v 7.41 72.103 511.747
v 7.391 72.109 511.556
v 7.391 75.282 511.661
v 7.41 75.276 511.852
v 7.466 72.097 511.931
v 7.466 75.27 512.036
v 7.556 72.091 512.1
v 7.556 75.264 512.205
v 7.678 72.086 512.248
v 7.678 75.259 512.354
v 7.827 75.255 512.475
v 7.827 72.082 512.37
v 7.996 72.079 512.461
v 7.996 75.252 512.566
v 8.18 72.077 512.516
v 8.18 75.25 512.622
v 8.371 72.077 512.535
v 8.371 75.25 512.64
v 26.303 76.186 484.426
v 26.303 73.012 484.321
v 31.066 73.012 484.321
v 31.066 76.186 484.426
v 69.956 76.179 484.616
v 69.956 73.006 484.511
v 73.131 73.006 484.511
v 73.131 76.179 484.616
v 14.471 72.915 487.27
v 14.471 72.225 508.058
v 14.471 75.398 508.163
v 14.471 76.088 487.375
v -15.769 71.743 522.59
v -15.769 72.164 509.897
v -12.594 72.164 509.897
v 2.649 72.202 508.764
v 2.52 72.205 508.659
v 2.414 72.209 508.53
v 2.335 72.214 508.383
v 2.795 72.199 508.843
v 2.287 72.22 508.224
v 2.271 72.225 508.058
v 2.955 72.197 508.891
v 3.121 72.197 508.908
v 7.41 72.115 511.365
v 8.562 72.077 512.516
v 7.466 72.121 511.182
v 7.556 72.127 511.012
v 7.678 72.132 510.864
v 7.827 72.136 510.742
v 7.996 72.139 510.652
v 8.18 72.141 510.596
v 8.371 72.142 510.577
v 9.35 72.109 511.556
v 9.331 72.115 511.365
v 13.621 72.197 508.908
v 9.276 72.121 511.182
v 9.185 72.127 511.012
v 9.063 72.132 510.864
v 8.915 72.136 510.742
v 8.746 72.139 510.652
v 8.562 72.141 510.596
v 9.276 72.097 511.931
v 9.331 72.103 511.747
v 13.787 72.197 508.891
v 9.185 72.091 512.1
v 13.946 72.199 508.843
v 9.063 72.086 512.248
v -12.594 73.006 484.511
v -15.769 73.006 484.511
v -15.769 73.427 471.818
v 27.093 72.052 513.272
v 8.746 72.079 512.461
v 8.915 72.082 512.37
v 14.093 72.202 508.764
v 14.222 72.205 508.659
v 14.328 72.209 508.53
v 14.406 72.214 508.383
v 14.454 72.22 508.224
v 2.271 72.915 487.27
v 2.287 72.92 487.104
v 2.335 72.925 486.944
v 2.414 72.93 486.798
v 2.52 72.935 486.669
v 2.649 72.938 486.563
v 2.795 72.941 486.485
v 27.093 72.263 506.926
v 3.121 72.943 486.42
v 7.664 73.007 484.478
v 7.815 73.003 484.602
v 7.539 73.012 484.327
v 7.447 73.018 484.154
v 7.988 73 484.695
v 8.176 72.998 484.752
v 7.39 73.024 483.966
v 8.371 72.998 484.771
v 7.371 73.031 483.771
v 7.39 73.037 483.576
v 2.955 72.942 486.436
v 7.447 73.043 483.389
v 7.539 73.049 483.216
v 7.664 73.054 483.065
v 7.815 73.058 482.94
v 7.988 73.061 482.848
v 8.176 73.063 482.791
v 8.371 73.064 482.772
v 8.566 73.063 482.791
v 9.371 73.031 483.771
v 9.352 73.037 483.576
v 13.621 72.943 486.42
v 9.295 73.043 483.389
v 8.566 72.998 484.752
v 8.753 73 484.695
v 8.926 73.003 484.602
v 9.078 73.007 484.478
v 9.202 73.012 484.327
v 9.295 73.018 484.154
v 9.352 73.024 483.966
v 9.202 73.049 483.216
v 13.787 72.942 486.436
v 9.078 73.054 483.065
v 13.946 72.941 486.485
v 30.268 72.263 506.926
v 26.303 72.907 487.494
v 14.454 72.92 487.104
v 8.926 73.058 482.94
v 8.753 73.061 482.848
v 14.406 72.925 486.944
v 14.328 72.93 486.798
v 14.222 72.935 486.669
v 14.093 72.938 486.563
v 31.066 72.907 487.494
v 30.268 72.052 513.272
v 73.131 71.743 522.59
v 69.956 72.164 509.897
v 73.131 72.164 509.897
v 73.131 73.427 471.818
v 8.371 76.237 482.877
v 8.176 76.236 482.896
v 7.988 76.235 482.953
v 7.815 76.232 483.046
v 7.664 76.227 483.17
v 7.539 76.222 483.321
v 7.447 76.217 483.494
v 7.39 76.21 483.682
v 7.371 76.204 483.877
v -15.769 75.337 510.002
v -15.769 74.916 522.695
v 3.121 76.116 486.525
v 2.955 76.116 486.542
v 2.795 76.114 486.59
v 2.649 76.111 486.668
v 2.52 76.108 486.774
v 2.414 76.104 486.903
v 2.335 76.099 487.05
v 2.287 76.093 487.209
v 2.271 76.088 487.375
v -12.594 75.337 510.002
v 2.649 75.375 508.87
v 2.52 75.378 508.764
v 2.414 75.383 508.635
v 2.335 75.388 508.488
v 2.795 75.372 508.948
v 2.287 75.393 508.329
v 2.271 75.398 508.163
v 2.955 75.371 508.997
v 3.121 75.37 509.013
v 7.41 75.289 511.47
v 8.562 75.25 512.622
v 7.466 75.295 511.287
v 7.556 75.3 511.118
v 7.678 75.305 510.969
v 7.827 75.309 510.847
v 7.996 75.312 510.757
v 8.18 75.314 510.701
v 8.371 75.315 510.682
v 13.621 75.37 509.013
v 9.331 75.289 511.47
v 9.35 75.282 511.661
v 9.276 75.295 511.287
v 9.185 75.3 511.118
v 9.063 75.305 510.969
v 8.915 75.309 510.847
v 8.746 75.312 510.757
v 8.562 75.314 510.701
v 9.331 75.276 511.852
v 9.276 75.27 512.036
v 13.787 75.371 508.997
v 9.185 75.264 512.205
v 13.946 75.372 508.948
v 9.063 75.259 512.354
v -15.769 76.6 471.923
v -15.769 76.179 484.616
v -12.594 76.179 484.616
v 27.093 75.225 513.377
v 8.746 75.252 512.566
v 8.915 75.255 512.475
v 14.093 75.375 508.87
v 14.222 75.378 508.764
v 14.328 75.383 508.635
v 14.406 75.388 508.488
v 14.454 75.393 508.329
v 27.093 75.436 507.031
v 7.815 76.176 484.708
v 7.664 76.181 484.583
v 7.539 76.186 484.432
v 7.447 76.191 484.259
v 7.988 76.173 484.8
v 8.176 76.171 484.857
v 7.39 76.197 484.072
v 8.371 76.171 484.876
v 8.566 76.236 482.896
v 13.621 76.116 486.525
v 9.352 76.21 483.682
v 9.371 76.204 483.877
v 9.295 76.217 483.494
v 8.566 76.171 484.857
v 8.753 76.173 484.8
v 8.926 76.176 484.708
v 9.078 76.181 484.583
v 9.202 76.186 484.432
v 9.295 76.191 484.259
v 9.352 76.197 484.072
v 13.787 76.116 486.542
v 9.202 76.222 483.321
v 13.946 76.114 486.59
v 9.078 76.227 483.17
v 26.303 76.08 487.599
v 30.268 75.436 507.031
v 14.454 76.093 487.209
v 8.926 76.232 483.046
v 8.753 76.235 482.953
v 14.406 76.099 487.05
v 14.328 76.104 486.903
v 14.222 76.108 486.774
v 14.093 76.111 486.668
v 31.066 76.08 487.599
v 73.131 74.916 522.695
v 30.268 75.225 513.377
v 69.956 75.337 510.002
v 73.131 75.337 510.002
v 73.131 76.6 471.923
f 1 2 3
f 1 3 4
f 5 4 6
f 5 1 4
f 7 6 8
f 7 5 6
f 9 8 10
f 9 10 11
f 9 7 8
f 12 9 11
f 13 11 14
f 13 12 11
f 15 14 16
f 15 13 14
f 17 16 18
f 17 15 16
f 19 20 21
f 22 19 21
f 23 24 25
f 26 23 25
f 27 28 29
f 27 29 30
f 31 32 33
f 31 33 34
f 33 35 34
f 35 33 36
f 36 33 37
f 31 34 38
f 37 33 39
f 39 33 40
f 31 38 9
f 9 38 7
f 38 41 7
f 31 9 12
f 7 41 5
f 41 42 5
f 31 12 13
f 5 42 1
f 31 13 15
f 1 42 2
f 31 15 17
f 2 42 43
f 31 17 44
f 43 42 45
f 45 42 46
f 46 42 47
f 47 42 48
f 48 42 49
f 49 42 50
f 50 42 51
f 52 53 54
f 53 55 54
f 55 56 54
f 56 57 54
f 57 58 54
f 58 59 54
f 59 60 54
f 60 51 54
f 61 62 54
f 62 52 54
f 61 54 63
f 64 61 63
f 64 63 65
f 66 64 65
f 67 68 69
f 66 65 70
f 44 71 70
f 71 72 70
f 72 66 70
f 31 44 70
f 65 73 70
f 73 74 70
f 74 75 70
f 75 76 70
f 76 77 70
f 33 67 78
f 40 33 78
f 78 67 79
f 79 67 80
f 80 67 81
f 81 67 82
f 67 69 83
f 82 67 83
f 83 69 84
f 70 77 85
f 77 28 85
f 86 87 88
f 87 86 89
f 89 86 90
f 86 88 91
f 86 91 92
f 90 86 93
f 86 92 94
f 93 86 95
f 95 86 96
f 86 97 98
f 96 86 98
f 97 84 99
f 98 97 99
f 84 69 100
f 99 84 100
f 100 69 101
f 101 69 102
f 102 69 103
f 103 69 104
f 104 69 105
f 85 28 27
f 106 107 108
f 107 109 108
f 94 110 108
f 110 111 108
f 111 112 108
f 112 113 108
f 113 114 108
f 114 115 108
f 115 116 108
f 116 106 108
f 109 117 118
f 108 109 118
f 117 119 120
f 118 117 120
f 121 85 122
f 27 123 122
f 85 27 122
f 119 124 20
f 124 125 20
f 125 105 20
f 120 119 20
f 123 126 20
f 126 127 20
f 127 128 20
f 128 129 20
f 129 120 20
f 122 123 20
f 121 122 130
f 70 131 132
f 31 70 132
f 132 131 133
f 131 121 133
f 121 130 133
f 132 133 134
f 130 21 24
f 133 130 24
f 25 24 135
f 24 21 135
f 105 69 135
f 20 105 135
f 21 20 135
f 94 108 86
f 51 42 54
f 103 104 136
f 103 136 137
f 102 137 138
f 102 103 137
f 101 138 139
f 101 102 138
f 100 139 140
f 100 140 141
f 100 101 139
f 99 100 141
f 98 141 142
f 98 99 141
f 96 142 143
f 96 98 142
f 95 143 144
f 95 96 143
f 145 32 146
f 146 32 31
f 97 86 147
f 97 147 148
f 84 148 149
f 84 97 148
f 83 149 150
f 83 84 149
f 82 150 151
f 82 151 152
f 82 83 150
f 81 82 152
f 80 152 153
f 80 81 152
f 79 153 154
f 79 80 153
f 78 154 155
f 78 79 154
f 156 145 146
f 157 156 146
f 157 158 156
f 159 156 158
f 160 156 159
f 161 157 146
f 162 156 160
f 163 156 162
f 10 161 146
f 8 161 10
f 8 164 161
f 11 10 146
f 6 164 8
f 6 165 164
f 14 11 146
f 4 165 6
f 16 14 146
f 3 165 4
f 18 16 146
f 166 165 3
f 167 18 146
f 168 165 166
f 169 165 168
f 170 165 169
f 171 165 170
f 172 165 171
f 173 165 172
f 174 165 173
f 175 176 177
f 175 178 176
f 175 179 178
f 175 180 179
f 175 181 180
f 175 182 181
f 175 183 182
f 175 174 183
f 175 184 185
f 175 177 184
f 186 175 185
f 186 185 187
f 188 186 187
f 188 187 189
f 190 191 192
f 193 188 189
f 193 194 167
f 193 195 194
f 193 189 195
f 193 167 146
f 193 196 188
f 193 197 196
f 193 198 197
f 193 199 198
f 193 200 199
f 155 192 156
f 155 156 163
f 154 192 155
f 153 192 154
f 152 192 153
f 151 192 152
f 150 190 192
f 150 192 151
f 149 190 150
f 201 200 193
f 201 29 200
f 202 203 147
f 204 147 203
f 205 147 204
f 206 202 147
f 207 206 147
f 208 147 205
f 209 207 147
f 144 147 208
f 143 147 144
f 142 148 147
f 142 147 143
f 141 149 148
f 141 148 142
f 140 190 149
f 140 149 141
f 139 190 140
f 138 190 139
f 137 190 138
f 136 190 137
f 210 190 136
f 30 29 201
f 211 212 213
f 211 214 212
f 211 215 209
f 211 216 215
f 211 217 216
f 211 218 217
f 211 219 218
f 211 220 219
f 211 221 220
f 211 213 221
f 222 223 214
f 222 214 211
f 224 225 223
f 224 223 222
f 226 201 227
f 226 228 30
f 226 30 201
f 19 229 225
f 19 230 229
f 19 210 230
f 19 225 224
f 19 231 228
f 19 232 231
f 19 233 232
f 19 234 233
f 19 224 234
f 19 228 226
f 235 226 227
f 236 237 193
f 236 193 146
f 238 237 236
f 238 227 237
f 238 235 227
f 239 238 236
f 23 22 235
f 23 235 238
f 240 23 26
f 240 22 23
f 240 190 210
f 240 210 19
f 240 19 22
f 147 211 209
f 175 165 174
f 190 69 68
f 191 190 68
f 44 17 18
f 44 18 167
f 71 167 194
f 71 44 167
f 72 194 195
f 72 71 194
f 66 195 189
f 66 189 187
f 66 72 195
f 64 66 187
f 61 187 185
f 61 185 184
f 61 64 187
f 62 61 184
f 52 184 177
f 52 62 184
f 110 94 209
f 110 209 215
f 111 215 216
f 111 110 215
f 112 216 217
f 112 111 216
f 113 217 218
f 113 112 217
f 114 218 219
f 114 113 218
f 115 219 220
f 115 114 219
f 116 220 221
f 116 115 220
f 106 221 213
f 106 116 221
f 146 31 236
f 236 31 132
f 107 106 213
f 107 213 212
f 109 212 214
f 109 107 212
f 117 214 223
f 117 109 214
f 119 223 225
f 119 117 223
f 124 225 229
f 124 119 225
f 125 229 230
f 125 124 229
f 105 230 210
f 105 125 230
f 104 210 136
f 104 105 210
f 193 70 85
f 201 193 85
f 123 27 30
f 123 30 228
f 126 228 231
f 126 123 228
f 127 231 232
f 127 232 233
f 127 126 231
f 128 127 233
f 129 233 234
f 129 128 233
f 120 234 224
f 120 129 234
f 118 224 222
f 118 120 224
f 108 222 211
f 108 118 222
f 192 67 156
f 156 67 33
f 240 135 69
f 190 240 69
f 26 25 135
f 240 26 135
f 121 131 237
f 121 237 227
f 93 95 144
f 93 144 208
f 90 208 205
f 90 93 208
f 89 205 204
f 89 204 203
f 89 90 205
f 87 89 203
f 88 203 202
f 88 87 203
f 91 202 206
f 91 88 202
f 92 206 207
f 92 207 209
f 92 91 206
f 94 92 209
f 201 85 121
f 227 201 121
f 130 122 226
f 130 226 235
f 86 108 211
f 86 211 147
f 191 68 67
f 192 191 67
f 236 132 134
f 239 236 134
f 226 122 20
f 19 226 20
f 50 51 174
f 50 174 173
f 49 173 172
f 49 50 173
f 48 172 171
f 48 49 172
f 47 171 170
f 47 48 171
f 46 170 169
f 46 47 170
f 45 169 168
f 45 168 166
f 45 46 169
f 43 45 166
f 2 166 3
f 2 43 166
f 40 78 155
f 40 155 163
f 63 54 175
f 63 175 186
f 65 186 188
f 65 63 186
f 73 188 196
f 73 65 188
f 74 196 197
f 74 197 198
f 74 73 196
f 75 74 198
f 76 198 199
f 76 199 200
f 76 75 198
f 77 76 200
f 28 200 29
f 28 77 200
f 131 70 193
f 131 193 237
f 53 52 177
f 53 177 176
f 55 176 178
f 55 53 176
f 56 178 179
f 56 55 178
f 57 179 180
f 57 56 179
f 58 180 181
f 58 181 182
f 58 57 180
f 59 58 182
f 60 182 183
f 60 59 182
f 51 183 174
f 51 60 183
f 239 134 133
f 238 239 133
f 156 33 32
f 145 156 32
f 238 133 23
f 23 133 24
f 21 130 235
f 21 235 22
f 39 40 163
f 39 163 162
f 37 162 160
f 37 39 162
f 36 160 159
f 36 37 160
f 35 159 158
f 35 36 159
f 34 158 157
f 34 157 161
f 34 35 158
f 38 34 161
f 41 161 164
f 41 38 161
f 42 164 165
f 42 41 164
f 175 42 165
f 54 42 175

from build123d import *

# Parameters (mm, degrees)
SKETCH3_W           = 4.7625
SKETCH3_H           = 3.175
SKETCH3_W_2         = 3.175
SKETCH3_H_2         = 6.35
BOSS_EXTRUDE2_DEPTH = 3.175


with BuildPart() as part:
    # Sketch3 → Boss-Extrude2 (new body)
    with BuildSketch(Plane(origin=(0, 88.979885655, 2.951534319), x_dir=(1, 0, 0), z_dir=(0, 0.9994503024750413, 0.03315256977292581))):
        Polygon((73.130884883, -481.824366224), (73.130884883, -469.124366224), (-15.769115117, -469.124366224), (-15.769115117, -481.824366224), (-12.594115117, -481.824366224), (-12.594115117, -507.224366224), (-15.769115117, -507.224366224), (-15.769115117, -519.924366224), (73.130884883, -519.924366224), (73.130884883, -507.224366224), (69.955884883, -507.224366224), (69.955884883, -481.824366224), align=None)
        with Locations((28.684303559, -483.221366224)):
            Rectangle(SKETCH3_W, SKETCH3_H, mode=Mode.SUBTRACT)
        with Locations((28.680884883, -507.426337868)):
            Rectangle(SKETCH3_W_2, SKETCH3_H_2, mode=Mode.SUBTRACT)
        with BuildLine():
            Line((13.62075844, -483.734366224), (3.12075844, -483.734366224))
            ThreePointArc((3.12075844, -483.734366224), (2.519717676, -483.98332546), (2.27075844, -484.584366224))
            Line((2.27075844, -484.584366224), (2.27075844, -505.384366224))
            ThreePointArc((2.27075844, -505.384366224), (2.519717676, -505.985406988), (3.12075844, -506.234366224))
            Line((3.12075844, -506.234366224), (13.62075844, -506.234366224))
            ThreePointArc((13.62075844, -506.234366224), (14.221799204, -505.985406988), (14.47075844, -505.384366224))
            Line((14.47075844, -505.384366224), (14.47075844, -484.584366224))
            ThreePointArc((14.47075844, -484.584366224), (14.221799204, -483.98332546), (13.62075844, -483.734366224))
        make_face(mode=Mode.SUBTRACT)
        with BuildLine():
            ThreePointArc((9.350271075, -508.884366224), (9.063378466, -508.191746198), (8.37075844, -507.904853589))
            ThreePointArc((8.37075844, -507.904853589), (7.678138413, -508.191746198), (7.391245805, -508.884366224))
            ThreePointArc((7.391245805, -508.884366224), (7.678138413, -509.576986251), (8.37075844, -509.863878859))
            ThreePointArc((8.37075844, -509.863878859), (9.063378466, -509.576986251), (9.350271075, -508.884366224))
        make_face(mode=Mode.SUBTRACT)
        with BuildLine():
            ThreePointArc((8.37075844, -482.084366224), (9.077865221, -481.791473005), (9.37075844, -481.084366224))
            ThreePointArc((9.37075844, -481.084366224), (9.077865221, -480.377259443), (8.37075844, -480.084366224))
            ThreePointArc((8.37075844, -480.084366224), (7.663651658, -480.377259443), (7.37075844, -481.084366224))
            ThreePointArc((7.37075844, -481.084366224), (7.663651658, -481.791473005), (8.37075844, -482.084366224))
        make_face(mode=Mode.SUBTRACT)
    extrude(amount=BOSS_EXTRUDE2_DEPTH)


solid = part.part
